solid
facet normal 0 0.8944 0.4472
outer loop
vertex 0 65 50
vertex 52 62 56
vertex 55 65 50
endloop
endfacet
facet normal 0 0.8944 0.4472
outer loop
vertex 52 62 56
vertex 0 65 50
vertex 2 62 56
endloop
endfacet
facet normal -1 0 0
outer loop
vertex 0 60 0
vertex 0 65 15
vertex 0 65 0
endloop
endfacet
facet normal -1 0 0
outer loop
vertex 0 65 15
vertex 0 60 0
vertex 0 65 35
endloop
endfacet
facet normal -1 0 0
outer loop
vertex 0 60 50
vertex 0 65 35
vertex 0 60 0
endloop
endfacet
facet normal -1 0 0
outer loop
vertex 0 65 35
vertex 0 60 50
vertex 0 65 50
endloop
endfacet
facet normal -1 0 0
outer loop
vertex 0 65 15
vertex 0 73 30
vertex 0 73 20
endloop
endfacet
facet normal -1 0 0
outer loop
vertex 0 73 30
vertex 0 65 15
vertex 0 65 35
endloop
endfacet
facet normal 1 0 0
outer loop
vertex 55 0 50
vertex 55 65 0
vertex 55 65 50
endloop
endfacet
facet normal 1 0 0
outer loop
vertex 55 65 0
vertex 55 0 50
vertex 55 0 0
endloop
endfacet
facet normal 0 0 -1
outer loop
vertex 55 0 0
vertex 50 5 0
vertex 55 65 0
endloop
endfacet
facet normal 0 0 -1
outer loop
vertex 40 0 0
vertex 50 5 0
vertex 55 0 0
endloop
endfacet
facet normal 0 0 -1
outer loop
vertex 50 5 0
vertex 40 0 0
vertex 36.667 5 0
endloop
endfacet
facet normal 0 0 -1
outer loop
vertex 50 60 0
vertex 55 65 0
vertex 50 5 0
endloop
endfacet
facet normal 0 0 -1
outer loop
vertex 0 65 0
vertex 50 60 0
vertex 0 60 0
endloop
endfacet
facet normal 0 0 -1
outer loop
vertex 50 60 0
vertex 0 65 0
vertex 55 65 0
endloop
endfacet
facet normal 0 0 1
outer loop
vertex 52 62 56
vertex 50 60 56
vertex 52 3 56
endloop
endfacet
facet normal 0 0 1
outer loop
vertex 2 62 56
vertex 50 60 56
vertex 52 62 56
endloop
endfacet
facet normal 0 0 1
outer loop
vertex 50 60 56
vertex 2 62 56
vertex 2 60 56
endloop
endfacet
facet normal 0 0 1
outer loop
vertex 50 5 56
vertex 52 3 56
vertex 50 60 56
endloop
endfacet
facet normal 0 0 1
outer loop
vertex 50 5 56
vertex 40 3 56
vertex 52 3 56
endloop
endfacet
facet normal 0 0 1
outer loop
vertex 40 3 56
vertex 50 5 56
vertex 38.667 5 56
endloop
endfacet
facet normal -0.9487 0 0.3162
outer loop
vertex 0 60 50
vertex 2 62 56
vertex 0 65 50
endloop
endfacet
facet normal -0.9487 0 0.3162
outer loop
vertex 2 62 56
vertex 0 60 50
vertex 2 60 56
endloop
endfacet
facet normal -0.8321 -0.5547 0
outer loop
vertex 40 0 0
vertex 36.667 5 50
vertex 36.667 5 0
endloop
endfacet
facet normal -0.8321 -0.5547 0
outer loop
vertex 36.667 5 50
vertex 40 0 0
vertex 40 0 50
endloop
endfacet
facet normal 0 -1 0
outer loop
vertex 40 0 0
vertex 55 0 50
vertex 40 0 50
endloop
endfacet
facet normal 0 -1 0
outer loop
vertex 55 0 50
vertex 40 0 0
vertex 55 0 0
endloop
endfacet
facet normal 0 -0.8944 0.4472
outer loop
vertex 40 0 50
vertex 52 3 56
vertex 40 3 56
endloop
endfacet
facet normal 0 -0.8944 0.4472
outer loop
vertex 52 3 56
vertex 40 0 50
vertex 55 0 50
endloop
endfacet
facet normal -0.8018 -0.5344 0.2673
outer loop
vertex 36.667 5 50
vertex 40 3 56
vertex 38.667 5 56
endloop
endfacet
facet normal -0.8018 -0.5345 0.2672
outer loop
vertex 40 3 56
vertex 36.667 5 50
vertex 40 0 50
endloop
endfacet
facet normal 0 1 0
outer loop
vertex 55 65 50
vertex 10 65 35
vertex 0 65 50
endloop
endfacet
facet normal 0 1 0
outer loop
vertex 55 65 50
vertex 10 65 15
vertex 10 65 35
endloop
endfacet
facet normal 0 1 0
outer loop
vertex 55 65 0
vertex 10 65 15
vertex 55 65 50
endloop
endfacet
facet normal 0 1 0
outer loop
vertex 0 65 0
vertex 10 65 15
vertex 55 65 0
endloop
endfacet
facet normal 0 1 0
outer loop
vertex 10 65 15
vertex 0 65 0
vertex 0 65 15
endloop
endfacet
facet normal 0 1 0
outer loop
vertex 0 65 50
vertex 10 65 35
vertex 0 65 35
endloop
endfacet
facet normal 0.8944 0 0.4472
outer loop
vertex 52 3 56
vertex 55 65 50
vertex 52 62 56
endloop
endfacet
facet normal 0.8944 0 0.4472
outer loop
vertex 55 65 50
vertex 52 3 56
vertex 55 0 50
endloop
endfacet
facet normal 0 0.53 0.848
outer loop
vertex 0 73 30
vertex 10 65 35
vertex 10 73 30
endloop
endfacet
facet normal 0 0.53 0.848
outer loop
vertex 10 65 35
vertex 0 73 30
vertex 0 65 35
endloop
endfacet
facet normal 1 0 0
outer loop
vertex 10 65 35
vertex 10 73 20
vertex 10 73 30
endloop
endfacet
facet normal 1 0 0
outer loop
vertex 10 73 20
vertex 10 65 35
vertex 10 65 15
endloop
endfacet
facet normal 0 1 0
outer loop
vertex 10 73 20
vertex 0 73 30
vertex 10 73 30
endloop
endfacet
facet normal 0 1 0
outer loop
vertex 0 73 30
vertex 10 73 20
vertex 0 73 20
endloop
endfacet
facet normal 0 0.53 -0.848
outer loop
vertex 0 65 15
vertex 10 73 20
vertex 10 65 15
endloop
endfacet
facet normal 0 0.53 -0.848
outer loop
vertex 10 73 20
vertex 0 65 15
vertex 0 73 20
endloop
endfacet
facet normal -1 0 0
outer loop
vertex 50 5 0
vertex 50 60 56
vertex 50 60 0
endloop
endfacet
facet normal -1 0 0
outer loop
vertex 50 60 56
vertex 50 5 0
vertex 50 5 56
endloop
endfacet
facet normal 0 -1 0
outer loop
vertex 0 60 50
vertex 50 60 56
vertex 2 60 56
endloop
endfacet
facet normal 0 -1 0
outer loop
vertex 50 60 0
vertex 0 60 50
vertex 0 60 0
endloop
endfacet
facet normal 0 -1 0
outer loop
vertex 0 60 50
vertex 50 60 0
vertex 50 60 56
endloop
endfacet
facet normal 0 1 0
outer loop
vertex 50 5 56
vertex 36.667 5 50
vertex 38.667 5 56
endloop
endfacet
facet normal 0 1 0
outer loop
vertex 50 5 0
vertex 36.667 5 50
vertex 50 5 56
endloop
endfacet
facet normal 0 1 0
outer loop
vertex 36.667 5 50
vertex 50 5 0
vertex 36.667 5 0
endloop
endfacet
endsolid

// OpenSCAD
width=50;

difference(){
    
    union(){
hull(){
linear_extrude(width) 
polygon([[0,60],[50,60],[50,5],[40,5],[40,0],[55,0],[55,65],[0,65]]);

translate([0,0,width+5])
linear_extrude(1) 
polygon([[2,60],[50,60],[50,5],[40,5],[40,3],[52,3],[52,62],[2,62]]);
}
translate([0,65,width/2])
rotate([0,90,0])
linear_extrude(10)
polygon([[-10,0],[-5,8],[5,8],[10,0]]);


}
translate([0,5,0])
cube([50,55,60]);
}
